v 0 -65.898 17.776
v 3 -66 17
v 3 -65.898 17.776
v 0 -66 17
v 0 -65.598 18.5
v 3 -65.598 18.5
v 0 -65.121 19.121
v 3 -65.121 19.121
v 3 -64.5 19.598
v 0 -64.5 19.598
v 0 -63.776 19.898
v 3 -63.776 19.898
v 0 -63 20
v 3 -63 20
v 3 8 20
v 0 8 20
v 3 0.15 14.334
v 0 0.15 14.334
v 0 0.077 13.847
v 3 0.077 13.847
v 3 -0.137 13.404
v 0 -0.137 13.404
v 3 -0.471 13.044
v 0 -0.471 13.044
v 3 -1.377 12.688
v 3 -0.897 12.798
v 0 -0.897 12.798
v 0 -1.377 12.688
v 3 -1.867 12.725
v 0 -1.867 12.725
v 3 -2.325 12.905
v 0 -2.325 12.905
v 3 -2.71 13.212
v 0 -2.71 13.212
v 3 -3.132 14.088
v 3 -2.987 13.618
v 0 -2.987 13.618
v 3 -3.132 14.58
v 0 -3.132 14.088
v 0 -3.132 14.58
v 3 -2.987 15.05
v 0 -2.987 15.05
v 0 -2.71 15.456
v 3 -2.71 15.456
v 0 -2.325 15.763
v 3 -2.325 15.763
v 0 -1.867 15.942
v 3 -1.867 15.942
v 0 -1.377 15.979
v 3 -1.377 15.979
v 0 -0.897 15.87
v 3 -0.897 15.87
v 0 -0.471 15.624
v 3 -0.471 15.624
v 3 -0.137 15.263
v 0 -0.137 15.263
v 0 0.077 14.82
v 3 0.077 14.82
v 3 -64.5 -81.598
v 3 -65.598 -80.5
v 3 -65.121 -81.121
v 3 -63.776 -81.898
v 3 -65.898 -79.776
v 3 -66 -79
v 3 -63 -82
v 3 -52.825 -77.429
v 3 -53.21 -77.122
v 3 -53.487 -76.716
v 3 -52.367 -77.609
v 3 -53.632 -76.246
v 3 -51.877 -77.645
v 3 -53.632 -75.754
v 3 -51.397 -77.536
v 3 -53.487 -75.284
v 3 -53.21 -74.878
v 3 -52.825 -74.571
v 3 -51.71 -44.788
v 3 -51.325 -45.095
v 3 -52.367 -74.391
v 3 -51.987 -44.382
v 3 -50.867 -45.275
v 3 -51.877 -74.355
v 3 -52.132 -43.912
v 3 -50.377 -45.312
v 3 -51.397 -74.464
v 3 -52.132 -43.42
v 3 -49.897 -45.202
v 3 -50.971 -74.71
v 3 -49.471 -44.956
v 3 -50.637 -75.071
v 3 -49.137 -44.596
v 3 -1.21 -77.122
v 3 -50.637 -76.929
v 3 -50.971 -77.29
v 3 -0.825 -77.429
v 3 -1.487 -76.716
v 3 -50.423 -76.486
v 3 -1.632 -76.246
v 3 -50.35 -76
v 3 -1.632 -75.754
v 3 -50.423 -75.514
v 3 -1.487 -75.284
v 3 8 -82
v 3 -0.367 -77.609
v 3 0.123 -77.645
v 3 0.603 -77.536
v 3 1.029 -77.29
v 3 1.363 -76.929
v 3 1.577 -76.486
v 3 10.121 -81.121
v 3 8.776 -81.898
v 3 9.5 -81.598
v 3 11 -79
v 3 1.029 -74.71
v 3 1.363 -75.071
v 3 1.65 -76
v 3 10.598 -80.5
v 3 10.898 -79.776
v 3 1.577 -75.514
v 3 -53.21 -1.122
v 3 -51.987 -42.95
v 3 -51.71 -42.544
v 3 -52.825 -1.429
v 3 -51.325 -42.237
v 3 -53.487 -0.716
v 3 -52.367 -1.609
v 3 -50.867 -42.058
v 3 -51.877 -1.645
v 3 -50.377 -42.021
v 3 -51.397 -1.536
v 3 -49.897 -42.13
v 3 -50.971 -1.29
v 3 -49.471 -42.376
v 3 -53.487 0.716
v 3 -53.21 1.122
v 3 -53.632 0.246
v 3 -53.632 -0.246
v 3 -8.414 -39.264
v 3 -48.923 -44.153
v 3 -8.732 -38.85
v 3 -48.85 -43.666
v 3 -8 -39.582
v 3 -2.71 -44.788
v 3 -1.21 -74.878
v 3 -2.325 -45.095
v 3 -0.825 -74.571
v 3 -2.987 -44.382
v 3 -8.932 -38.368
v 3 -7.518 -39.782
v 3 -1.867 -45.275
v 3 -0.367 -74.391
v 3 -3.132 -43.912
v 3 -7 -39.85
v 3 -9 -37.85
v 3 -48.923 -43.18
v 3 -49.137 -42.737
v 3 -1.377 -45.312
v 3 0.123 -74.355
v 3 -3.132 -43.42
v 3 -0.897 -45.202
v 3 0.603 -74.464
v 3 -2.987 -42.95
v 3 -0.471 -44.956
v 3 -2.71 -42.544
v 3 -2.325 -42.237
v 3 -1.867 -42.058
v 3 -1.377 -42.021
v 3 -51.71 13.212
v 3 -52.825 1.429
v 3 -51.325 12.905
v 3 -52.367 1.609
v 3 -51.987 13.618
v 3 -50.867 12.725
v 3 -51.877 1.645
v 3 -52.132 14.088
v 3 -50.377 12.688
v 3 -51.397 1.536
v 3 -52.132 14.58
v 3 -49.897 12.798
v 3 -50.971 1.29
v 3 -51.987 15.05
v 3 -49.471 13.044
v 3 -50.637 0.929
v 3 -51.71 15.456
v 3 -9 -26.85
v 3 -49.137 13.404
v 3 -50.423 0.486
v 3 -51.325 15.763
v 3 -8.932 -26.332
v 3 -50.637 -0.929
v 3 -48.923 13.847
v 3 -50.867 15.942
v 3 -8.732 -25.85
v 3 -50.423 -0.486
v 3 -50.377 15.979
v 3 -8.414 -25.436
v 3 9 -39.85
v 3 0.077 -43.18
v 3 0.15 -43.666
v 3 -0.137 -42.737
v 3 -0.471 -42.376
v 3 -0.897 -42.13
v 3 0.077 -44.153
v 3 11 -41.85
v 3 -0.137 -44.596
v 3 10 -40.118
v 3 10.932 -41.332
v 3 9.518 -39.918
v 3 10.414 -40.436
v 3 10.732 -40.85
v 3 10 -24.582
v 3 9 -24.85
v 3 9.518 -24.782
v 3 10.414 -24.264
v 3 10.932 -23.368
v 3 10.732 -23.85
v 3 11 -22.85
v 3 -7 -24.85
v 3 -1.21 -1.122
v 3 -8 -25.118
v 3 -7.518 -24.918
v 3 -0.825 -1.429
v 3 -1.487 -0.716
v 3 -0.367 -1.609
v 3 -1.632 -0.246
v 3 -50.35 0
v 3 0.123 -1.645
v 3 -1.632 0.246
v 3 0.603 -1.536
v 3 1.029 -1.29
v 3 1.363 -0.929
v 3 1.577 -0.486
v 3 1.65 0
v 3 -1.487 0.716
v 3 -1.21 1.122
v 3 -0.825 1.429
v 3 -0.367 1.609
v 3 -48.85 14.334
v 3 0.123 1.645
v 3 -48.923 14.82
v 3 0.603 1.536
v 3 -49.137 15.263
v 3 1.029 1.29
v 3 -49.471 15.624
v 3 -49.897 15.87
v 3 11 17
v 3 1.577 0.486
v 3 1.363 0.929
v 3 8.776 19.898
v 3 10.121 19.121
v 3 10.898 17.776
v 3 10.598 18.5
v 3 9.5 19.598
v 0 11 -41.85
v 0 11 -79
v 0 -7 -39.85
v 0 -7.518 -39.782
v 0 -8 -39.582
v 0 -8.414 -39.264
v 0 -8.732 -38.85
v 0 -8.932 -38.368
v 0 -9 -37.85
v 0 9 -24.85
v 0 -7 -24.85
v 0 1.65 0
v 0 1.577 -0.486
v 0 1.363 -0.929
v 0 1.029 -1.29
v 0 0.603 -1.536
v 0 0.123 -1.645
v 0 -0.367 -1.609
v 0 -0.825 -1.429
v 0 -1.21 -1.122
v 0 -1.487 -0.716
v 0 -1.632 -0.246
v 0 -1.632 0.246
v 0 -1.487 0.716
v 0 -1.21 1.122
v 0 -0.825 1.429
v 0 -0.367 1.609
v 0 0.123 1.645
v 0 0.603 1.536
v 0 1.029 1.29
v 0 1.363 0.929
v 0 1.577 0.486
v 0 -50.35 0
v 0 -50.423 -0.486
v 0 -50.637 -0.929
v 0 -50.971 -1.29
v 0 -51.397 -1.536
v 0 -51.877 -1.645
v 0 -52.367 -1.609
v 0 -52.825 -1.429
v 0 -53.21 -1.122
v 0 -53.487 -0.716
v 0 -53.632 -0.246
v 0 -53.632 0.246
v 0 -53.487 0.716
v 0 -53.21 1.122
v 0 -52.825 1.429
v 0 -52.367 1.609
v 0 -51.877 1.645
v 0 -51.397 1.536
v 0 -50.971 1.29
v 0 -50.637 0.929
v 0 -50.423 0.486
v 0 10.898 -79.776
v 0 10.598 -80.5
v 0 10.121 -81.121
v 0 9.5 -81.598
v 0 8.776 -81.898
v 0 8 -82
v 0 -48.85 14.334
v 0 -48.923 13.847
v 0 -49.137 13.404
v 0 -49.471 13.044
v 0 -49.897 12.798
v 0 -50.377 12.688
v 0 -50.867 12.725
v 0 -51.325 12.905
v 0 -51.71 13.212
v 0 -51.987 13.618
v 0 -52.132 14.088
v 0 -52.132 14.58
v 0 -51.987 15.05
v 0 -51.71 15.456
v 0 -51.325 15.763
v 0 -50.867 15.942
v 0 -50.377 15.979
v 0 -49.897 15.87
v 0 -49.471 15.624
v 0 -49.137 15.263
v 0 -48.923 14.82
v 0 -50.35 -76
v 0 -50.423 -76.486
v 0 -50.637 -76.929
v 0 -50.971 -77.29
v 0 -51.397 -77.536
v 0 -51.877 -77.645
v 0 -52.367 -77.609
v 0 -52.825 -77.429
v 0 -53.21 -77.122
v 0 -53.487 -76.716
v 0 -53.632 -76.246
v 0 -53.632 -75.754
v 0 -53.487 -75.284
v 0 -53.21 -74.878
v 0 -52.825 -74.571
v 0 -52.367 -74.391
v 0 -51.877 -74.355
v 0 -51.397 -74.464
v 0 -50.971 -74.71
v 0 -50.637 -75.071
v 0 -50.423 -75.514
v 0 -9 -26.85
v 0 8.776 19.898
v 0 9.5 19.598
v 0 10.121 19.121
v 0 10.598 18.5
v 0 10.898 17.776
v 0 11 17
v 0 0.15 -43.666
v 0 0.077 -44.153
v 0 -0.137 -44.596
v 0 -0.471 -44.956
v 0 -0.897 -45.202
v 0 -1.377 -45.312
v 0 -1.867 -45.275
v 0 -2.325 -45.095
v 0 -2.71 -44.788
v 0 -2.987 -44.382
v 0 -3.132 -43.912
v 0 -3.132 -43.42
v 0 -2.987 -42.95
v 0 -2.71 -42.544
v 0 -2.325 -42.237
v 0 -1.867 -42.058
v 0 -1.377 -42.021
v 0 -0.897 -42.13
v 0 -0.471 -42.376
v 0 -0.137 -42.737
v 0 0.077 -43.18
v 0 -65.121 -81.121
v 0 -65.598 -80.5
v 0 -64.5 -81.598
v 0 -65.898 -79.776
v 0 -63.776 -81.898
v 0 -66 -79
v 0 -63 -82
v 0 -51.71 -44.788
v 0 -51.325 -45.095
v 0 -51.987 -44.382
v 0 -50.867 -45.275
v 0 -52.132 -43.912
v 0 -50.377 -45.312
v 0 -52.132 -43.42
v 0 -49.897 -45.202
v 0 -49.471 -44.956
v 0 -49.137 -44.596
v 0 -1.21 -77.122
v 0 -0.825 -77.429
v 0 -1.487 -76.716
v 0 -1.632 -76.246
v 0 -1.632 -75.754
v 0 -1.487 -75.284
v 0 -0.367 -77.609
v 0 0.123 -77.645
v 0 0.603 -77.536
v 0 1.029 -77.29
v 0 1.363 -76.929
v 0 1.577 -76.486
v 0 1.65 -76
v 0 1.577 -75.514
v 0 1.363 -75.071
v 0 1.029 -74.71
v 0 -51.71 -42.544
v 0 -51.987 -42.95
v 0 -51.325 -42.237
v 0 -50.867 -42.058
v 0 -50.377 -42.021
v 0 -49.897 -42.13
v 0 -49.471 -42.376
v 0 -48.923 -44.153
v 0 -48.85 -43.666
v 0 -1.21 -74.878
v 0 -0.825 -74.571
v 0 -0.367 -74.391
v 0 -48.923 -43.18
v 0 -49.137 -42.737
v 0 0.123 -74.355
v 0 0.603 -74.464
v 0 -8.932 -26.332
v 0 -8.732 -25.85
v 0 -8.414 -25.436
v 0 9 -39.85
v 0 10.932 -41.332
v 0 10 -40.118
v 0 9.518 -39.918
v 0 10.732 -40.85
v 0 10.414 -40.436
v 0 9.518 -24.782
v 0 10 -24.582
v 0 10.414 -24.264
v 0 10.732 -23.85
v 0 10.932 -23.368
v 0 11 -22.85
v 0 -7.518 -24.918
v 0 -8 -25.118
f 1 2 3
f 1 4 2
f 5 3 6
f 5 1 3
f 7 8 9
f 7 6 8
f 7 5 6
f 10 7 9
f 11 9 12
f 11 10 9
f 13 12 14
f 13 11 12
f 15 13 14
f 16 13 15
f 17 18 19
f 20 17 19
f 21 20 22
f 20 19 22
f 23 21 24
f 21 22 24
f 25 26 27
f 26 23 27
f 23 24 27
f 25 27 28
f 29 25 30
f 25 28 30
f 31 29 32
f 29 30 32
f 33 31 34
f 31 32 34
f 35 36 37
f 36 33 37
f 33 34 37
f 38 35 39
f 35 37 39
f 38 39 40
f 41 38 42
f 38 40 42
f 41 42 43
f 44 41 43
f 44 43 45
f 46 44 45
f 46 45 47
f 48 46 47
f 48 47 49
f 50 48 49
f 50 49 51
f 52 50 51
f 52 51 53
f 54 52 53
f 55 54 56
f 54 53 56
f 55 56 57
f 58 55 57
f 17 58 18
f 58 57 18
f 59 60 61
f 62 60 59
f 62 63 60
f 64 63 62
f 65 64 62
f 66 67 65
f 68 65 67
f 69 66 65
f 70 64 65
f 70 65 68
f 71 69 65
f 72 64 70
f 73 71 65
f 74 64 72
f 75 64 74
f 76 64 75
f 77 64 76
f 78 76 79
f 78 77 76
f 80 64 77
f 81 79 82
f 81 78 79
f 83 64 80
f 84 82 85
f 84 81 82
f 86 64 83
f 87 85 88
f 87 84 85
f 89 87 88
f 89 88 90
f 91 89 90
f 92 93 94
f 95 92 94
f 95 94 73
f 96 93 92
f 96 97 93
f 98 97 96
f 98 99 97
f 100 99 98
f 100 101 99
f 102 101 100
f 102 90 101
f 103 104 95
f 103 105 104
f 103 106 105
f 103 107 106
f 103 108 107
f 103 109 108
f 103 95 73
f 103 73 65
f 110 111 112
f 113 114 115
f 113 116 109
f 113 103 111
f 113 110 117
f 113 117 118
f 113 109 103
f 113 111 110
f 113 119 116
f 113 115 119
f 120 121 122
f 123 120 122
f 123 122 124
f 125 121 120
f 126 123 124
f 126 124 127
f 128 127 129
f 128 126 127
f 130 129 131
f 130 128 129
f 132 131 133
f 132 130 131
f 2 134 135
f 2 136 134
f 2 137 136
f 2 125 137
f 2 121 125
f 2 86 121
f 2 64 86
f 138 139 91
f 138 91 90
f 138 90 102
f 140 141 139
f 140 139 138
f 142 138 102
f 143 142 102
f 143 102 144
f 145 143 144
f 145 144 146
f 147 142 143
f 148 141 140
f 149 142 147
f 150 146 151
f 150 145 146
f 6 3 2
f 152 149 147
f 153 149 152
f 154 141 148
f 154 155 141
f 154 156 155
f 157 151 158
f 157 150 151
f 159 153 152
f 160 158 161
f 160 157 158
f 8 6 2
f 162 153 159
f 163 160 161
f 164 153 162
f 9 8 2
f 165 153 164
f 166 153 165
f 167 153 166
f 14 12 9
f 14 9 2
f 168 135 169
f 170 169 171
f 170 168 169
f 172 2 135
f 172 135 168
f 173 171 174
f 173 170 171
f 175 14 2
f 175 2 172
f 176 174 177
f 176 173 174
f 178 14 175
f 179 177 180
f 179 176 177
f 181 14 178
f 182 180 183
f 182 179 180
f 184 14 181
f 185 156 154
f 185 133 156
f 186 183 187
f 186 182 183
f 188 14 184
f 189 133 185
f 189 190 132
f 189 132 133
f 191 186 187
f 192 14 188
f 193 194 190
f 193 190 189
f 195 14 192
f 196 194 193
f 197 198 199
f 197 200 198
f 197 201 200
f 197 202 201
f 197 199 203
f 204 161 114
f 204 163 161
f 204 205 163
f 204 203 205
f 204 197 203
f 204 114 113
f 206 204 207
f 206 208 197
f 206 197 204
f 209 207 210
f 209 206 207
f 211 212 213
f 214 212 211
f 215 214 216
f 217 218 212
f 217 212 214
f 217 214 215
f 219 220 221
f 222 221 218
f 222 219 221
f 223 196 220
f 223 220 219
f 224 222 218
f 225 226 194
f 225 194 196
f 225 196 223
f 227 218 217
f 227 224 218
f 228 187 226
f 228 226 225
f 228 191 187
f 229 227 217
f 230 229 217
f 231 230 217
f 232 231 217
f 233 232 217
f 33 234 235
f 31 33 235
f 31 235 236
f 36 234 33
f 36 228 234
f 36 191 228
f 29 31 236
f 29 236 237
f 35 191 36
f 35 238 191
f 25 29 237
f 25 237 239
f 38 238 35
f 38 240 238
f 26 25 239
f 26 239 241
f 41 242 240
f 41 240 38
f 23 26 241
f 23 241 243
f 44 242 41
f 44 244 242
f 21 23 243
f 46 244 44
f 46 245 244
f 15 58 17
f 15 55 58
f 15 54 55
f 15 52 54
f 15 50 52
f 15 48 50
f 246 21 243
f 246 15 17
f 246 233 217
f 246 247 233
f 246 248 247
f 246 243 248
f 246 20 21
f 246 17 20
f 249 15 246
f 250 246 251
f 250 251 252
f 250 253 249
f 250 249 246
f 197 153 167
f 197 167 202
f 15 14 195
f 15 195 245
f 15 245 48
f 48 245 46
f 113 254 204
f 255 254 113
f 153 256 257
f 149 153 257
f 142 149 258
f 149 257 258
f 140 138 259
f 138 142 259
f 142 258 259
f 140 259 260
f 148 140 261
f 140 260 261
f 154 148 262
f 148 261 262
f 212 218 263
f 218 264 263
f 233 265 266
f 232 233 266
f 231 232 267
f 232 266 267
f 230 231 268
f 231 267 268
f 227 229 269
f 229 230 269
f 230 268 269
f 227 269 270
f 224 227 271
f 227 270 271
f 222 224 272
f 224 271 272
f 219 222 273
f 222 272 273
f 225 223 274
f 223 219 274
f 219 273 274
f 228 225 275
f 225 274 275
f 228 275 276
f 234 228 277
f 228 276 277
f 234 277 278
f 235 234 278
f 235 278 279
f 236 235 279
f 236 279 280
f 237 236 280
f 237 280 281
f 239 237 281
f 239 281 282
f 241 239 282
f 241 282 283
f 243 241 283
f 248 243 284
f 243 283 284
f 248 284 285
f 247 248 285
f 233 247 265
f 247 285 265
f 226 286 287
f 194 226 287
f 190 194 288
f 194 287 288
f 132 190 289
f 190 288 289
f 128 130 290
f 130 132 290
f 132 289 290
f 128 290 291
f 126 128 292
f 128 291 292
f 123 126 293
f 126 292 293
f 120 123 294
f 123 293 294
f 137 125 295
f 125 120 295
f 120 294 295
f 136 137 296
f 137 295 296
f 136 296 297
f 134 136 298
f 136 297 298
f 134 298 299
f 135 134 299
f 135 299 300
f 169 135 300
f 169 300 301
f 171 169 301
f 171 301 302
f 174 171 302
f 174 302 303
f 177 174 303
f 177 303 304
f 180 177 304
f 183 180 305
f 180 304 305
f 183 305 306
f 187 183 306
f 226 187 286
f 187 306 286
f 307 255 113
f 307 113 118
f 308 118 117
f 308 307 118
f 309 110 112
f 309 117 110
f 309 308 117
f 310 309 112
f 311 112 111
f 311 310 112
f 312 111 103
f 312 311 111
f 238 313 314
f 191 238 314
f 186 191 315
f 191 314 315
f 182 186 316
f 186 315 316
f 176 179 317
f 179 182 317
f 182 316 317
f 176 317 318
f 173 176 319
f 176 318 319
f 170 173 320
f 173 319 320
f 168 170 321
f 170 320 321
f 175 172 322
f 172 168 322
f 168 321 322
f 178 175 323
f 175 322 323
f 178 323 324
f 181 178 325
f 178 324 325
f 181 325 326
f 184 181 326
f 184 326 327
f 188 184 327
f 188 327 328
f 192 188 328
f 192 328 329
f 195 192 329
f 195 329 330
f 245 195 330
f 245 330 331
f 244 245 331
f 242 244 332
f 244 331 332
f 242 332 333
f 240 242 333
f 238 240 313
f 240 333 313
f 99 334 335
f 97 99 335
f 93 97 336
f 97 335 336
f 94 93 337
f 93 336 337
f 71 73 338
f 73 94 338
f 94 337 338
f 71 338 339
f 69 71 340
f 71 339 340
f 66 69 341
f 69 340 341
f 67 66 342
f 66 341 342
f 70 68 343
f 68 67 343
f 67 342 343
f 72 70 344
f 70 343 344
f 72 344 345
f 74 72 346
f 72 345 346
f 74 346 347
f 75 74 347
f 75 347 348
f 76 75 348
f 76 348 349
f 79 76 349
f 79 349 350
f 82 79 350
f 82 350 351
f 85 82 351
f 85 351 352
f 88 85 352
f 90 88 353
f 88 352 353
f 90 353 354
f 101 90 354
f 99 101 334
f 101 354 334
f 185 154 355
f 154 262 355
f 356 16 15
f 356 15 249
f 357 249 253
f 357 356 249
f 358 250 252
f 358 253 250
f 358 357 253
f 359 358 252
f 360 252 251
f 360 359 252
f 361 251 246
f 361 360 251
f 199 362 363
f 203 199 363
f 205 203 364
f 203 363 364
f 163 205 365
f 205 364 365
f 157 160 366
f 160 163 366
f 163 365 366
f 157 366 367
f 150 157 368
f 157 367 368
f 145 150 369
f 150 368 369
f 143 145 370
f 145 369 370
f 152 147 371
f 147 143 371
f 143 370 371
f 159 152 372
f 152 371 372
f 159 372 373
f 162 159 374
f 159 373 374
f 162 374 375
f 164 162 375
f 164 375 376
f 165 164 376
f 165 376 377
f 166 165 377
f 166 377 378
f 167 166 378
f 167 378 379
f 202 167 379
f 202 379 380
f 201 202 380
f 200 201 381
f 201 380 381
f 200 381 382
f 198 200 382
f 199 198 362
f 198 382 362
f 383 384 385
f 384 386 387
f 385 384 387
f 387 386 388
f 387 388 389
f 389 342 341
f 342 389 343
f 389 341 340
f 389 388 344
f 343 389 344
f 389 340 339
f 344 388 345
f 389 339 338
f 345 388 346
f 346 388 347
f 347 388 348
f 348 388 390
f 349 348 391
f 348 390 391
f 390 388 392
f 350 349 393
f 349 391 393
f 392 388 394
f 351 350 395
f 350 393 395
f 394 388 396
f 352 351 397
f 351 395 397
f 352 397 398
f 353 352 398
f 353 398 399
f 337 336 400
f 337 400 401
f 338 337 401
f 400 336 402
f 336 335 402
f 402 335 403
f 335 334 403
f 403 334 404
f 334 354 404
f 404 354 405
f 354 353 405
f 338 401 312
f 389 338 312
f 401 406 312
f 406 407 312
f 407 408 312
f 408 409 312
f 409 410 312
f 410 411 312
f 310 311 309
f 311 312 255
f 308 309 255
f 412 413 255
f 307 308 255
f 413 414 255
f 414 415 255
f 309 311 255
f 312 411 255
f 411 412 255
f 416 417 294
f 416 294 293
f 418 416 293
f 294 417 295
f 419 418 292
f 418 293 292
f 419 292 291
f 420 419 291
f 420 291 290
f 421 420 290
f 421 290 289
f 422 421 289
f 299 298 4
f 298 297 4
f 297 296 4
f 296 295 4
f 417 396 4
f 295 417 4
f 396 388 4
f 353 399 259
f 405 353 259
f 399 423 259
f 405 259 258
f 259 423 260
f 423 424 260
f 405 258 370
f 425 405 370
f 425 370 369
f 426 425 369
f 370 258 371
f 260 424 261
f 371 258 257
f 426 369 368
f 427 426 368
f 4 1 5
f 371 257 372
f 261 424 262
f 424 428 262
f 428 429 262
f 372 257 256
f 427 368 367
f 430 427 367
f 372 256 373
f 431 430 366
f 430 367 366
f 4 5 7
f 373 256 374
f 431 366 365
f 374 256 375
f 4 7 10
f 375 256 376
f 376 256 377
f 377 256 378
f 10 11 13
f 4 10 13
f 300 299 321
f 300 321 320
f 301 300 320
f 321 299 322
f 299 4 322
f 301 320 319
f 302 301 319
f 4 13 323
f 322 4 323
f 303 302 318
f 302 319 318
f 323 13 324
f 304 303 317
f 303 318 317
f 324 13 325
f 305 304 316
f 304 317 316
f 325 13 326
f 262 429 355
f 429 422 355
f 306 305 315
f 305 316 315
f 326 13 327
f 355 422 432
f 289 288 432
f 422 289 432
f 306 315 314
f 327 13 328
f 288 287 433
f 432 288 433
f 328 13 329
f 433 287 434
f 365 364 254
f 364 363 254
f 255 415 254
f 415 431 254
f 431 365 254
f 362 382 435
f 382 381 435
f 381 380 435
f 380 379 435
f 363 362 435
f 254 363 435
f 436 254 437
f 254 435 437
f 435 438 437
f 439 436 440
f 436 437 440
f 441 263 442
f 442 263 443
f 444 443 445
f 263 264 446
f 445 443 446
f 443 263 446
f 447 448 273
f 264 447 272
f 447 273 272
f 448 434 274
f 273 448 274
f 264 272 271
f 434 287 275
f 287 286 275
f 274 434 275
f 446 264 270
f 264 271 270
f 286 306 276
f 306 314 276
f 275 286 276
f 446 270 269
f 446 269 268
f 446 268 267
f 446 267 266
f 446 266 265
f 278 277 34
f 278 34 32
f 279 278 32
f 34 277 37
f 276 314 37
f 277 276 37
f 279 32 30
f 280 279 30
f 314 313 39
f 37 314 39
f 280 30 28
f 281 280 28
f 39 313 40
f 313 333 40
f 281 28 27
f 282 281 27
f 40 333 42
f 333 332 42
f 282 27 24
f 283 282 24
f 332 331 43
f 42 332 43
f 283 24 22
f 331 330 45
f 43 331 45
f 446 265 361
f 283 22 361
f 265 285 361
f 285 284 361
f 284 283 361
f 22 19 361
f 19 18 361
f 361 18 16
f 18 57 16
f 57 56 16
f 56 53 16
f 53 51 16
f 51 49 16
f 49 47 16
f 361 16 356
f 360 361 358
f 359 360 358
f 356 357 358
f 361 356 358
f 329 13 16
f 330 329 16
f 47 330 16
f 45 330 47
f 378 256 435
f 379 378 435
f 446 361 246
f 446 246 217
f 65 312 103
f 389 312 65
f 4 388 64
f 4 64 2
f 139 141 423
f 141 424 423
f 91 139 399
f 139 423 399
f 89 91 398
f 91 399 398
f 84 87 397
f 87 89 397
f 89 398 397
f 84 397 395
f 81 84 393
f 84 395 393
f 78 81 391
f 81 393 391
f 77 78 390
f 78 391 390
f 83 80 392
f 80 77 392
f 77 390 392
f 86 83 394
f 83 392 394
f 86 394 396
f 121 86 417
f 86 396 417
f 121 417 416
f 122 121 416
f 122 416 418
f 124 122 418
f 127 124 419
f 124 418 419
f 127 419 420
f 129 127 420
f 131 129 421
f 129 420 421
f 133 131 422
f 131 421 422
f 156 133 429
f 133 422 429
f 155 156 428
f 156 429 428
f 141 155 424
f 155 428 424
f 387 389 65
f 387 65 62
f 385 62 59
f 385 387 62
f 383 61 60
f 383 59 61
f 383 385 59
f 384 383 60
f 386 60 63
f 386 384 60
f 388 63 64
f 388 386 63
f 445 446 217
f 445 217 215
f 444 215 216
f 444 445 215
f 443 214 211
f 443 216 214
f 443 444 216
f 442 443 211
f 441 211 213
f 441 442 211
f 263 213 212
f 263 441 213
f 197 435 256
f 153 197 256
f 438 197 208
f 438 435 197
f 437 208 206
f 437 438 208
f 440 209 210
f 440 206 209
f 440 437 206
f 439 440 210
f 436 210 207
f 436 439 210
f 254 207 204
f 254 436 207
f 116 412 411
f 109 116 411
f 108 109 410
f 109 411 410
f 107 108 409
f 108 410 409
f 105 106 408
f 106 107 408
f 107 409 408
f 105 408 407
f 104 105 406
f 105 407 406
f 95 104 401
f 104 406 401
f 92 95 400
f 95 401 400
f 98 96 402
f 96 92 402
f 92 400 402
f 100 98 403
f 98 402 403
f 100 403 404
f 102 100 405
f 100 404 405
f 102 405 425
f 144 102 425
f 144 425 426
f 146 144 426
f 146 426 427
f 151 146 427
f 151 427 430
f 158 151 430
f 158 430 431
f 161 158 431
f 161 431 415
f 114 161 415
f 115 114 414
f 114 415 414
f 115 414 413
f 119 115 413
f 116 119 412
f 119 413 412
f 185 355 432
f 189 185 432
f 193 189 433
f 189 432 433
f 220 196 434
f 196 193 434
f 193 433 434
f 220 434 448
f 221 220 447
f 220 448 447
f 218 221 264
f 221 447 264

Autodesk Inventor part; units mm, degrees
ref_plane "YZ Plane" through (0, 0, 0) normal (1, 0, 0) x (0, 1, 0)
ref_plane "XZ Plane" through (0, 0, 0) normal (0, 1, 0) x (-1, 0, 0)
ref_plane "XY Plane" through (0, 0, 0) normal (0, 0, 1) x (1, 0, 0)
sketch "Эскиз1" plane through (0, 0, 0) normal (1, 0, 0) x (0, 1, 0)
  circle A0 centre (0, 0) radius 1.65
  circle A1 centre (0, -76) radius 1.65
  circle A2 centre (-52, 0) radius 1.65
  circle A3 centre (-52, -76) radius 1.65
  line L0 (-63, 20) -> (8, 20)
  line L1 (8, -82) -> (-63, -82)
  line L2 (-66, -79) -> (-66, 17)
  arc A4 (11, 17) -> (8, 20) centre (8, 17) ccw
  arc A5 (8, -82) -> (11, -79) centre (8, -79) ccw
  arc A6 (-66, -79) -> (-63, -82) centre (-63, -79) ccw
  arc A7 (-63, 20) -> (-66, 17) centre (-63, 17) ccw
  circle A8 centre (-1.5, -43.6662) radius 1.65
  circle A9 centre (-50.5, -43.6662) radius 1.65
  circle A10 centre (-1.5, 14.3338) radius 1.65
  circle A11 centre (-50.5, 14.3338) radius 1.65
  line L3 (9, -39.8501) -> (-7, -39.8501)
  line L4 (-9, -37.8501) -> (-9, -26.8501)
  line L5 (-7, -24.8501) -> (9, -24.8501)
  line L6 (11, 17) -> (11, -22.8501)
  line L7 (11, -41.8501) -> (11, -79)
  arc A12 (-9, -37.8501) -> (-7, -39.8501) centre (-7, -37.8501) ccw
  arc A13 (-7, -24.8501) -> (-9, -26.8501) centre (-7, -26.8501) ccw
  arc A14 (9, -24.8501) -> (11, -22.8501) centre (9, -22.8501) ccw
  arc A15 (11, -41.8501) -> (9, -39.8501) centre (9, -41.8501) ccw
  point P0 (11, -39.8501)
  point P1 (-9, -39.8501)
  point P2 (-9, -24.8501)
  dimension "d4" = 3.3
  dimension "d8" = 3.3
  dimension "d13" = 3.3
  dimension "d14" = 3.3
  dimension "d20" = 3
  dimension "d23" = 52
  dimension "d29" = 3.3
  dimension "d31" = 3.3
  dimension "d34" = 3.3
  dimension "d35" = 3.3
  dimension "d36" = 20
  dimension "d37" = 15
  dimension "d38" = 2
extrude "Выдавливание2" add sketch "Эскиз1" along normal blind 3
properties part number "adapter_arduino_to_power"
